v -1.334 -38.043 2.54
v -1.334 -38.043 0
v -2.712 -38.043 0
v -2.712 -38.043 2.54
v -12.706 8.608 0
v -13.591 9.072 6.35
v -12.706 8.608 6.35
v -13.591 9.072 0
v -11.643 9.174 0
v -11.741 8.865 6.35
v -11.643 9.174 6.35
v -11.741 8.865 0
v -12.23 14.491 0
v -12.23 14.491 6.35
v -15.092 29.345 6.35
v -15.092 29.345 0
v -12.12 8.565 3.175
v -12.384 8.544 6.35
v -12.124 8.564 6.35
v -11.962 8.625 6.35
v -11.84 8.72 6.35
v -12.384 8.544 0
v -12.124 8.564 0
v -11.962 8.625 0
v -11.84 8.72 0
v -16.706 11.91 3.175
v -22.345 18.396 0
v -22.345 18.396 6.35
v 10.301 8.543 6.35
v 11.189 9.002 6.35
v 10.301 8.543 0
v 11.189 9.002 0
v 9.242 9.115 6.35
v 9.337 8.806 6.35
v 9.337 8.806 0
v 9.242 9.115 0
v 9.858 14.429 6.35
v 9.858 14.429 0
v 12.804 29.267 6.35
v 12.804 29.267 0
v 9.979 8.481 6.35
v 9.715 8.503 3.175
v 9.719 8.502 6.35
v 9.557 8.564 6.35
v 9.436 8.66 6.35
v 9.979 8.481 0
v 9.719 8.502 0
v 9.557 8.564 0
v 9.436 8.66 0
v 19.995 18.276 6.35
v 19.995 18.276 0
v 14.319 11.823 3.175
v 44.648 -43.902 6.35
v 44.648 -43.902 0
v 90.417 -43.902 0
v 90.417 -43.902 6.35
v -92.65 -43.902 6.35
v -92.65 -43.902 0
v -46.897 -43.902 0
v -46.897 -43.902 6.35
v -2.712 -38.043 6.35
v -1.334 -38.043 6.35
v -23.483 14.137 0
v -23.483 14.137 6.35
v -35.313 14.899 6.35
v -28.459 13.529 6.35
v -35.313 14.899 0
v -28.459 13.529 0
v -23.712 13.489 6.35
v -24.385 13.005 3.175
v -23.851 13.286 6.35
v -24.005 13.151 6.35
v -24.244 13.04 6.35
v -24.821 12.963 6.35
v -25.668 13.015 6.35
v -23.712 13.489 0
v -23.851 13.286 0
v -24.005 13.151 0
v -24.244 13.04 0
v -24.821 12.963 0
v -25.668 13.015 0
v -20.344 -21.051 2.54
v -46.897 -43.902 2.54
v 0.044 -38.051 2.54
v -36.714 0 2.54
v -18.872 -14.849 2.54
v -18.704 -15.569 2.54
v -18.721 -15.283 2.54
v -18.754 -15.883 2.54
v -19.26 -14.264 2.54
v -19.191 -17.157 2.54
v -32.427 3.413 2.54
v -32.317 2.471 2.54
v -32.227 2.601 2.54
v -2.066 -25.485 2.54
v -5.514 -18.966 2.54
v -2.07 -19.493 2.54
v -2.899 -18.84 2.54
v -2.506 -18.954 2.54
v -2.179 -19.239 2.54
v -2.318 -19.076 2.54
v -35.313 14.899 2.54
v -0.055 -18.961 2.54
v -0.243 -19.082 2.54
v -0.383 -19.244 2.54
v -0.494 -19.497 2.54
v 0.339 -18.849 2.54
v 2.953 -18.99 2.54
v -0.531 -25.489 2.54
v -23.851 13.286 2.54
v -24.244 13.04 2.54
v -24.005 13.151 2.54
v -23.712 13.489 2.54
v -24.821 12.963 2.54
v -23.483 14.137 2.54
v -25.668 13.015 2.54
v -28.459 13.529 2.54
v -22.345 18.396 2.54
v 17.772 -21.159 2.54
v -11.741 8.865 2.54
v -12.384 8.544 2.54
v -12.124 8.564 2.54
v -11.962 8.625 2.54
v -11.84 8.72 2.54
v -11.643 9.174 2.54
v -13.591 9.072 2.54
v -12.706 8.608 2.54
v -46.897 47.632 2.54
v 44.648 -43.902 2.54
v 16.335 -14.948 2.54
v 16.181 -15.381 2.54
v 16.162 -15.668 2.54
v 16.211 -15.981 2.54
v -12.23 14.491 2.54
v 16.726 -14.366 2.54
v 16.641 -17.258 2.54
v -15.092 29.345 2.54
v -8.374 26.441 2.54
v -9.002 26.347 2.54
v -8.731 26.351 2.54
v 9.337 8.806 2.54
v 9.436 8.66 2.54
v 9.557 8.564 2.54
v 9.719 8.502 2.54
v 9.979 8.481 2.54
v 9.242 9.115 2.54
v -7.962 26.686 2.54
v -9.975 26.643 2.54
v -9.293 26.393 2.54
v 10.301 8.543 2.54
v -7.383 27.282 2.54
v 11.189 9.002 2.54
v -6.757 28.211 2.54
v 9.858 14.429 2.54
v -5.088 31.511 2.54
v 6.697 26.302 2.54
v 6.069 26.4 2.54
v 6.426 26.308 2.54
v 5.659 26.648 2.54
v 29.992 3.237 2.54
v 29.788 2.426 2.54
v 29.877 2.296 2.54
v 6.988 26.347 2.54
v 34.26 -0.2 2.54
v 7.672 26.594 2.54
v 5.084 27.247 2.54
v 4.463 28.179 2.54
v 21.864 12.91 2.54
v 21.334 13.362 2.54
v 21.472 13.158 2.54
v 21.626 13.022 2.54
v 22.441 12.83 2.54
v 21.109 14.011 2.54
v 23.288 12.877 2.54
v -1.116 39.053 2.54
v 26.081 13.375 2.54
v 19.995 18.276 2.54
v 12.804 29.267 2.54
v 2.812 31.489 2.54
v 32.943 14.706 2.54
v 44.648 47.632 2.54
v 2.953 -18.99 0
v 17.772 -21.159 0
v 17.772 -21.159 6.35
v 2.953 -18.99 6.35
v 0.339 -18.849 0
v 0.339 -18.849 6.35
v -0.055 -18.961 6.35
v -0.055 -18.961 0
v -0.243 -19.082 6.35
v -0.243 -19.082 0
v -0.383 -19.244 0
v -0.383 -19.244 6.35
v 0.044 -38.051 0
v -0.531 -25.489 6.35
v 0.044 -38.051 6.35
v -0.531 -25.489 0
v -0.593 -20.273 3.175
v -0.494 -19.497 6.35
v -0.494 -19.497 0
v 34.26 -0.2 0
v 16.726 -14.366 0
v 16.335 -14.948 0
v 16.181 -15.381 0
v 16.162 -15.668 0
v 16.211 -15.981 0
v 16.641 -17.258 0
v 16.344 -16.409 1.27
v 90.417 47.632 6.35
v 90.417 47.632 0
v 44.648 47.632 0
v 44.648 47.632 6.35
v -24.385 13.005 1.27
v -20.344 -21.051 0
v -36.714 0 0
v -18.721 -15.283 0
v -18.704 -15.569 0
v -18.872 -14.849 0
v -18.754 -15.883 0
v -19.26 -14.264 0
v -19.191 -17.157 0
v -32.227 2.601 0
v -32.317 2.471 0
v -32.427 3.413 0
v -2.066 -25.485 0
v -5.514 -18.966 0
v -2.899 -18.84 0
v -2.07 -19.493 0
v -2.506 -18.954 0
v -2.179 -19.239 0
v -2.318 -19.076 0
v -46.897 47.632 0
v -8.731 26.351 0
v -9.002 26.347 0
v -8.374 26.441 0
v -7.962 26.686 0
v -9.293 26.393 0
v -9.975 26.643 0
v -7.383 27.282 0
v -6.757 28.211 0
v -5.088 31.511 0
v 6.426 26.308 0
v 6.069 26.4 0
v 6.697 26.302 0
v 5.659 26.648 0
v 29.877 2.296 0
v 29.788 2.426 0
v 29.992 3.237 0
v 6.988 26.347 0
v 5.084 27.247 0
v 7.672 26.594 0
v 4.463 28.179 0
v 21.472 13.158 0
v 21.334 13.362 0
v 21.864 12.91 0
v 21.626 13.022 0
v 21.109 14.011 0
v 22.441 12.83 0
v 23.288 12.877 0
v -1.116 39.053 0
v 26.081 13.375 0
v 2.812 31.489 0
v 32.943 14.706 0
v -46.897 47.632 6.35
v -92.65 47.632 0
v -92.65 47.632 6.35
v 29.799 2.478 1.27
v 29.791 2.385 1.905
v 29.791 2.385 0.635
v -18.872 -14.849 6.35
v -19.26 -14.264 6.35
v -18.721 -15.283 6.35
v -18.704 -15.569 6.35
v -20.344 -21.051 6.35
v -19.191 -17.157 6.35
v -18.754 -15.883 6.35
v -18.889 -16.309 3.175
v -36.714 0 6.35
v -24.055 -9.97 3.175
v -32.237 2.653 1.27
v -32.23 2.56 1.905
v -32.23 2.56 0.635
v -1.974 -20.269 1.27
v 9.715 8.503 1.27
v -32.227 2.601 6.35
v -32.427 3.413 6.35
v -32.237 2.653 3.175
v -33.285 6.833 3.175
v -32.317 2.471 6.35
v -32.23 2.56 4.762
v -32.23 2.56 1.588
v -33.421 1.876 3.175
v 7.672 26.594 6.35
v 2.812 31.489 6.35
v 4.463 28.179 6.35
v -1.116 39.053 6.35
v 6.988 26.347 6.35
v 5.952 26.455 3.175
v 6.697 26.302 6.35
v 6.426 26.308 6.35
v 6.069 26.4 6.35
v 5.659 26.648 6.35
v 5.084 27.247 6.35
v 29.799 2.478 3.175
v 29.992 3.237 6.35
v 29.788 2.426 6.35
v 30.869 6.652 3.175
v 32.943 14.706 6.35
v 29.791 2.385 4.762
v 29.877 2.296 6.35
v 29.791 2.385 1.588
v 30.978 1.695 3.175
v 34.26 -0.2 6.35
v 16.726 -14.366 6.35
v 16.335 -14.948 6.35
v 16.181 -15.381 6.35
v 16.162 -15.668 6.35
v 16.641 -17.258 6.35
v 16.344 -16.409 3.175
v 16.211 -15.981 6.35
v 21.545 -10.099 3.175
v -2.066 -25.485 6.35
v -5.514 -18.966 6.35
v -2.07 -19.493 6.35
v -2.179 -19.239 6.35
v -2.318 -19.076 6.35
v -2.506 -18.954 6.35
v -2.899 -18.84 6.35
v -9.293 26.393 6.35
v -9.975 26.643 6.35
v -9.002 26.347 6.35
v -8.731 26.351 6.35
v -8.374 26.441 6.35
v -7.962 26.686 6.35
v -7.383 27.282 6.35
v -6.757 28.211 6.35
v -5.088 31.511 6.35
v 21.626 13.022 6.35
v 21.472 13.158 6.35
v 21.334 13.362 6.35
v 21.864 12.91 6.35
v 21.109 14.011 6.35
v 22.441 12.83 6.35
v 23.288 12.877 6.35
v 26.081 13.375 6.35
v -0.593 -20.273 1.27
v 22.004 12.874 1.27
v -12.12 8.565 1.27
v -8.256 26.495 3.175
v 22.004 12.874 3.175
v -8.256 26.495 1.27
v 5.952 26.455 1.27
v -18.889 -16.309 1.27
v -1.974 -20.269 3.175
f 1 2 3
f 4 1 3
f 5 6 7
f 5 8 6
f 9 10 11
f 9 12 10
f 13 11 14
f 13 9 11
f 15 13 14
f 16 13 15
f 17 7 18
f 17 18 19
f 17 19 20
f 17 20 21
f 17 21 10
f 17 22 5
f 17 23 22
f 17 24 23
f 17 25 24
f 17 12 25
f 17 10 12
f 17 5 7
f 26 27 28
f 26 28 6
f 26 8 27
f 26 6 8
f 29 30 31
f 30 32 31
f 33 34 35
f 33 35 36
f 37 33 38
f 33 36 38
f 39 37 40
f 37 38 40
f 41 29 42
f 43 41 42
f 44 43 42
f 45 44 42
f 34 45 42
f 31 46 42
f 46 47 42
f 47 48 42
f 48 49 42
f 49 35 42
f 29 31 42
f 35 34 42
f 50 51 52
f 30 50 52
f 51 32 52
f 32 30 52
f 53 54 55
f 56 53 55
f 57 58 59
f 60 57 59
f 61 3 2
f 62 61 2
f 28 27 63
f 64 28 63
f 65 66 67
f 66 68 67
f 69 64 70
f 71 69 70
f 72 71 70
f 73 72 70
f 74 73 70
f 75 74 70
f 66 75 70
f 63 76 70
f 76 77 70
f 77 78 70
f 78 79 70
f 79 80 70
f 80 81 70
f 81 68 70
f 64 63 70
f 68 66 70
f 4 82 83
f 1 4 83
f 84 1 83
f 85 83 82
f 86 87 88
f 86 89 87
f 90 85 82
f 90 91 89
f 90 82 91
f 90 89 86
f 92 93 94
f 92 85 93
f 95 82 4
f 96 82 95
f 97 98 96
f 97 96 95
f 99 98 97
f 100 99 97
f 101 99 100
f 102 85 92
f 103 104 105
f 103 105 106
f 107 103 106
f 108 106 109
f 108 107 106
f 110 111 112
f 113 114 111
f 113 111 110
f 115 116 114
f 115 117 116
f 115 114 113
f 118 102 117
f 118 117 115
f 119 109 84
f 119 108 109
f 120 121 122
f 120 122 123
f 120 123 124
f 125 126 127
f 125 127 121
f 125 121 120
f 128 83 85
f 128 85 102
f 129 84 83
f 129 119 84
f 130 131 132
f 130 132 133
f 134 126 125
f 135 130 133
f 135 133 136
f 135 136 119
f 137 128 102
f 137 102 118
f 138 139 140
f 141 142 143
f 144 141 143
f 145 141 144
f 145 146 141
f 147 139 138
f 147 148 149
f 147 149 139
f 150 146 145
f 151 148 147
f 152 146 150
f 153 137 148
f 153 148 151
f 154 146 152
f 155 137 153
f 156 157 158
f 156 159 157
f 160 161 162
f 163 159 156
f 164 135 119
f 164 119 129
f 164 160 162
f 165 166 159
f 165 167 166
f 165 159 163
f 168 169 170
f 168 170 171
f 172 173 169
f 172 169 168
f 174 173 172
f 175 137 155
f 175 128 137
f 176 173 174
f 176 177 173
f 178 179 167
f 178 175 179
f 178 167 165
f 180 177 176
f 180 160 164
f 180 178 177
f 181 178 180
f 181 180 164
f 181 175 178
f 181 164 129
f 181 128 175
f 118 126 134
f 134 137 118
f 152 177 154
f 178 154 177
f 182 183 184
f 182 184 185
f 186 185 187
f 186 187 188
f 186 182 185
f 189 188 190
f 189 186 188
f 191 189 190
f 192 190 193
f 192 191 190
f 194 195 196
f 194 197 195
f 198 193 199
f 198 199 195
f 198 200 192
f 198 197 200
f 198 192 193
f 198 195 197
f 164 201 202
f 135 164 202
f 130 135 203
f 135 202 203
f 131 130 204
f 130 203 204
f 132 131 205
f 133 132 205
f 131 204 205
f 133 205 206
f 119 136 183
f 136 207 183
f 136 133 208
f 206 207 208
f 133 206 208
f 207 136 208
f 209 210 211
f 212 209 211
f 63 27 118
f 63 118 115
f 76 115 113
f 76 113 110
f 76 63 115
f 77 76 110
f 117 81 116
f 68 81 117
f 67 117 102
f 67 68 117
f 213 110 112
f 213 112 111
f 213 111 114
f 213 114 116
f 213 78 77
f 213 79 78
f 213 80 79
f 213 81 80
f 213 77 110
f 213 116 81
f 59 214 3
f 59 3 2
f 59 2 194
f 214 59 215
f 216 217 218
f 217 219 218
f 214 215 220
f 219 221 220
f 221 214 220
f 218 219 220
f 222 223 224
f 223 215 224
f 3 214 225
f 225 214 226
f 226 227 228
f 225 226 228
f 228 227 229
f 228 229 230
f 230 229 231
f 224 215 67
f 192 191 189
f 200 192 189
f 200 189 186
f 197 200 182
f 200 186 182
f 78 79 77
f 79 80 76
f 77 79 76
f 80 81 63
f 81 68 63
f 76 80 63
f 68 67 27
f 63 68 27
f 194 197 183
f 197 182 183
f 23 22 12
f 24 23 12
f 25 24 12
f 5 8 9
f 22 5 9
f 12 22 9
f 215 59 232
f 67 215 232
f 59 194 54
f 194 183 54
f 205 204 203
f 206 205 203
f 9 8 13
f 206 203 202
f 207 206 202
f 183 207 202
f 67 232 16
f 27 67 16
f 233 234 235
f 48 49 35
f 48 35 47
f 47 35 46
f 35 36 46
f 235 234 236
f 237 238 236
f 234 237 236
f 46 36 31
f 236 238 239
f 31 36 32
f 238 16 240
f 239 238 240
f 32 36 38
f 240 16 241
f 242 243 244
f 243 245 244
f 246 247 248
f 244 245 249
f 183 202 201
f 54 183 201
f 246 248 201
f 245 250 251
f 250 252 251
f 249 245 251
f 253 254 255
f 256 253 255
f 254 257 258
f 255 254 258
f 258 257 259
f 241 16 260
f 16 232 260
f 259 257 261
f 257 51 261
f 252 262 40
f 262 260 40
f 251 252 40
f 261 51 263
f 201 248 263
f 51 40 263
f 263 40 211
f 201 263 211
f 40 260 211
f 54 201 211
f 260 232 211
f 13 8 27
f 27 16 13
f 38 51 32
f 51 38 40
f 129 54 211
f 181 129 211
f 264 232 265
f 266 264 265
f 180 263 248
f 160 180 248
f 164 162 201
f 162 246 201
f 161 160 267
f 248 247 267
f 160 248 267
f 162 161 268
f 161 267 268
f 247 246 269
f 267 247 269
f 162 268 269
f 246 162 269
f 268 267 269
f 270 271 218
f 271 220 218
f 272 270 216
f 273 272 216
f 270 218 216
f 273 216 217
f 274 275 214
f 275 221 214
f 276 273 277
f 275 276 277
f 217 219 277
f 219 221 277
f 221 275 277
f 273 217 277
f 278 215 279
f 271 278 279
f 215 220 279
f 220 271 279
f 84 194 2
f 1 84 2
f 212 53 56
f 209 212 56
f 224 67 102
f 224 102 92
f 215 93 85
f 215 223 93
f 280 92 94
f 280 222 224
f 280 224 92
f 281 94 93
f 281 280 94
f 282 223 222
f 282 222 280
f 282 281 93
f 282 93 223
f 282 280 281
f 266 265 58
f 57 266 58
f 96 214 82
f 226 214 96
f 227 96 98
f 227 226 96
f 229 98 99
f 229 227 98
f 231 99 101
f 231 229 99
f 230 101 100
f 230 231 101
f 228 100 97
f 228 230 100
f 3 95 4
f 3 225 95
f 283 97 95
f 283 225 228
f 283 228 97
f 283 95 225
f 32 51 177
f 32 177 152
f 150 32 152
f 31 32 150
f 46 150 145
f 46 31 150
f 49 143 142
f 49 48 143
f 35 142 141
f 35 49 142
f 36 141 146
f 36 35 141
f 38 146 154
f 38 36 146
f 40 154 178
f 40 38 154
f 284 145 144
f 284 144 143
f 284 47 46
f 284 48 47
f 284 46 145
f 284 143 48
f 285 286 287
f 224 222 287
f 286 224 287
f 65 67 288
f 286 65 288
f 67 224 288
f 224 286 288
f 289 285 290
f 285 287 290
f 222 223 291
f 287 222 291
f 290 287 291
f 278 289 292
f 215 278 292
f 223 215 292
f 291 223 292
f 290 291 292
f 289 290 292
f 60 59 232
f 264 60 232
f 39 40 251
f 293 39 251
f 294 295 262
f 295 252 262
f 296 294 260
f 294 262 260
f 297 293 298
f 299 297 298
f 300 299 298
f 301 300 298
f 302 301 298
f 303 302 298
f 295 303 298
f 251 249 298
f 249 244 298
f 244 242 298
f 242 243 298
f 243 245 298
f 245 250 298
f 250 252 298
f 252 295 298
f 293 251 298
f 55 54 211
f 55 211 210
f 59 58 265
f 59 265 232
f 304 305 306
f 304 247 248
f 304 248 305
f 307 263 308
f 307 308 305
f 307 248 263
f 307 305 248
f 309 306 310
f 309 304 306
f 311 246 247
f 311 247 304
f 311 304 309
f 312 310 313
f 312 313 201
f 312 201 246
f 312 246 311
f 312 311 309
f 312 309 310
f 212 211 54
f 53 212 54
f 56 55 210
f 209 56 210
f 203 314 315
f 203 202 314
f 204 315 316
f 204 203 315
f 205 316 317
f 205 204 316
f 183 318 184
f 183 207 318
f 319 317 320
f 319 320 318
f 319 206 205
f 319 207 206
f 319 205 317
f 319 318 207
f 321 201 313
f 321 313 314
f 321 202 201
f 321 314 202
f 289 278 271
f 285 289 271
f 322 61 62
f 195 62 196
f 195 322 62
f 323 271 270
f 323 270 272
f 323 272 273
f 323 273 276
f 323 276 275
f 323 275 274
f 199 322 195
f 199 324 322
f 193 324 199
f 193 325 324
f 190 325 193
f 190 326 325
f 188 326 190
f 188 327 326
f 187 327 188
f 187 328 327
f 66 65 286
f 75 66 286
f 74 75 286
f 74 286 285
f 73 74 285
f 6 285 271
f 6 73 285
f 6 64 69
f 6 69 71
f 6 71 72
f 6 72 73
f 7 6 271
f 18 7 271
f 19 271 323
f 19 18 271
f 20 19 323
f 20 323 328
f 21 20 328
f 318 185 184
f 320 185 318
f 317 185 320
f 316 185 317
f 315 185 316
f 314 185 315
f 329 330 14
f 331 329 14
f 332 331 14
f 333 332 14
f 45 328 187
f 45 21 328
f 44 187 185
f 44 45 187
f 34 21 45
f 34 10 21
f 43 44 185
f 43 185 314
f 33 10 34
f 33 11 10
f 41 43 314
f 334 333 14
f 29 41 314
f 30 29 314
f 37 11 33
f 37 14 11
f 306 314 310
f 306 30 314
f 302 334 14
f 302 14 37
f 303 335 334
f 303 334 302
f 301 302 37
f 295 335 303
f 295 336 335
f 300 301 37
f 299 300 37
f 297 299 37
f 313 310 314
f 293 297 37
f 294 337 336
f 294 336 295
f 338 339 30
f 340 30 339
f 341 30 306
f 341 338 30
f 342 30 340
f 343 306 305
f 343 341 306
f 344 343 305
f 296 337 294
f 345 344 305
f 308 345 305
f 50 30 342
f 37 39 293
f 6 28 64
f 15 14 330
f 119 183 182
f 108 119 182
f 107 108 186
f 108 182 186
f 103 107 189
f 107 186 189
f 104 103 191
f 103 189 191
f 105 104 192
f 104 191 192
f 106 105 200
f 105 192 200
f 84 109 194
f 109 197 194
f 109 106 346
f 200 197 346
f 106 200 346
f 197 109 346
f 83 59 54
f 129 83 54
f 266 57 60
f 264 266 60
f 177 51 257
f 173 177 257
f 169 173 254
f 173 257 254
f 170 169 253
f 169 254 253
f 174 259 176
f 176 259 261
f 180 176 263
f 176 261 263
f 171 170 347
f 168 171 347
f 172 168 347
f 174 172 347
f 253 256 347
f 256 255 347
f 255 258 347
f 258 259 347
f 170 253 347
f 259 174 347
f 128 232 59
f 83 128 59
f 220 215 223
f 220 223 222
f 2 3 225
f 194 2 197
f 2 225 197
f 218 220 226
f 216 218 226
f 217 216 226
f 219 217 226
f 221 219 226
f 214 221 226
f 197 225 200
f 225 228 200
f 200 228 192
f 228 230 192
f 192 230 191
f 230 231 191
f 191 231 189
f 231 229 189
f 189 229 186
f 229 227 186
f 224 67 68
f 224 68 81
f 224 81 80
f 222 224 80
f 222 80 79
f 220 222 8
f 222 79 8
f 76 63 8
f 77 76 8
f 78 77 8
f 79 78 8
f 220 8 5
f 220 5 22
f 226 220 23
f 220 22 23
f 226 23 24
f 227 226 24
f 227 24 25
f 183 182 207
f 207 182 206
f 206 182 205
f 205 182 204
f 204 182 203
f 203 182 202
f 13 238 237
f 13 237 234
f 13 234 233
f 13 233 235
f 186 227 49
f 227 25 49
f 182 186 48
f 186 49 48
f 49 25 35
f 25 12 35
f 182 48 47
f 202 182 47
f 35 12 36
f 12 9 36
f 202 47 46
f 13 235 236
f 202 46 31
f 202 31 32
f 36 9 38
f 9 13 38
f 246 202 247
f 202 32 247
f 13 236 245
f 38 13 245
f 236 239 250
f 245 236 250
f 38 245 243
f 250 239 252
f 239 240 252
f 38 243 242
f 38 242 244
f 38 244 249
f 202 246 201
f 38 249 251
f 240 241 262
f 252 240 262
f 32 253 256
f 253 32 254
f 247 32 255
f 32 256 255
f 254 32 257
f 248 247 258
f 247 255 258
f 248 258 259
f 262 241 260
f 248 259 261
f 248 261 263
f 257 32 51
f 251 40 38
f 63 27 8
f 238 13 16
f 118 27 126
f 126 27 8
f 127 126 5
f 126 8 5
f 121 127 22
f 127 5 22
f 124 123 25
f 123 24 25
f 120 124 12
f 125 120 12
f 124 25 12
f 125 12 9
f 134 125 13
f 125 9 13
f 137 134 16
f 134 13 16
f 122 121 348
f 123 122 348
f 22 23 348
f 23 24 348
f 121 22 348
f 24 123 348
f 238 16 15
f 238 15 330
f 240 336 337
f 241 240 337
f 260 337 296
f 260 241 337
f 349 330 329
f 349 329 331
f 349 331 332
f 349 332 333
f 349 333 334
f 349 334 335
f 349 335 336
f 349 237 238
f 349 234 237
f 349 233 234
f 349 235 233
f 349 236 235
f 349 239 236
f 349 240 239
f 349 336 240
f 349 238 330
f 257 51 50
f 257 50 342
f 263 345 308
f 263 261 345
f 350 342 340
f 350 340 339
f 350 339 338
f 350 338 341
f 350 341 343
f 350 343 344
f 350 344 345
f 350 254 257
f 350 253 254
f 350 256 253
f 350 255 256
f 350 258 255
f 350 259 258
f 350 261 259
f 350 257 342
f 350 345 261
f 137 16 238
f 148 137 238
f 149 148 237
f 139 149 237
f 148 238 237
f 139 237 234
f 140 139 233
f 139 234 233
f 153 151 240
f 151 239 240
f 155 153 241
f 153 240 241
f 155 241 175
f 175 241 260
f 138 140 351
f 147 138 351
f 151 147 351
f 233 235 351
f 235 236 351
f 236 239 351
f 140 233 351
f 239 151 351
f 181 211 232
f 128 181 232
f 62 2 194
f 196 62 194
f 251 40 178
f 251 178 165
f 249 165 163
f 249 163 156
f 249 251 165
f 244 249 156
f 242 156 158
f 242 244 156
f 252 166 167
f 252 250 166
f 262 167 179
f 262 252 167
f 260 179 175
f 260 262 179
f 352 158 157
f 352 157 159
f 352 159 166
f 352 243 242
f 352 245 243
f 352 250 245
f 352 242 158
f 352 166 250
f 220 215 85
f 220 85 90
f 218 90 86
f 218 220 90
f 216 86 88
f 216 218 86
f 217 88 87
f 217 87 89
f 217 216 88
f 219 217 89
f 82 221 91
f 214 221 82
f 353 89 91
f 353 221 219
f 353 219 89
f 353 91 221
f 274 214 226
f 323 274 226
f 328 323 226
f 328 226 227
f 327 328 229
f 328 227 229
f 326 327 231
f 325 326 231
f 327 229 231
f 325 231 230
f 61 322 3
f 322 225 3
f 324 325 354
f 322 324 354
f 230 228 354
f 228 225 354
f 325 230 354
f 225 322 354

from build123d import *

# Parameters (mm, degrees)
F1_DEPTH = 6.35
F2_DEPTH = 6.35
F3_DEPTH = 2.54


with BuildPart() as f1:
    # F0 (on Top) → F1 (new body)
    with BuildSketch(Plane.XY):
        with BuildLine():
            Line((-1.1164610549, 39.0533058461), (-1.3339204969, -38.0429194985))
            Line((-1.3339204969, -38.0429194985), (0.043793726, -38.0506915872))
            add(Edge.make_bspline(
                [(17.7718664224, -21.1589155134), (0.1168053946, -18.7791340155), (-1.0387706532, -16.7492385287), (-0.4033229494, -28.6495818456), (0.043793726, -38.0506915872)],
                knots=[0, 0, 0, 0, 0.5041261797, 1, 1, 1, 1], degree=3))
            add(Edge.make_bspline(
                [(34.259852291, -0.2001895396), (15.8490805469, -14.437276867), (15.606946184, -14.5352669143), (17.1132727169, -18.5110401656), (17.7718664224, -21.1589155134)],
                knots=[0, 0, 0, 0, 0.6881774781, 1, 1, 1, 1], degree=3))
            add(Edge.make_bspline(
                [(32.9433250223, 14.7062445461), (30.3384353377, 4.5988348356), (29.6250505829, 1.7969355622), (29.7988422881, 2.4774735189), (34.259852291, -0.2001895396)],
                knots=[0, 0, 0, 0, 0.6090344785, 1, 1, 1, 1], degree=3))
            add(Edge.make_bspline(
                [(19.9948317708, 18.2764506918), (21.3200481739, 14.2618131265), (20.2614912616, 11.4966035445), (28.156229911, 14.0229906255), (32.9433250223, 14.7062445461)],
                knots=[0, 0, 0, 0, 0.4189137049, 1, 1, 1, 1], degree=3))
            add(Edge.make_bspline(
                [(19.9948317708, 18.2764506918), (12.7340992756, 9.5459144575), (8.0946791533, 6.723535087), (9.1870973138, 11.2900662286), (12.8041103318, 29.2666911636)],
                knots=[0, 0, 0, 0, 0.4511568874, 1, 1, 1, 1], degree=3))
            add(Edge.make_bspline(
                [(12.8041103318, 29.2666911636), (8.8818789195, 27.6771241004), (5.2027866351, 23.0069980044), (2.3285752692, 33.7038039952), (-1.1164610549, 39.0533058461)],
                knots=[0, 0, 0, 0, 0.4172698872, 1, 1, 1, 1], degree=3))
        make_face()
        with BuildLine():
            add(Edge.make_bspline(
                [(-20.3441573239, -21.0514045527), (-2.6759523888, -18.7712566966), (-1.5089436766, -16.7479123475), (-2.2115135166, -28.6444816204), (-2.7116566419, -38.0429194985)],
                knots=[0, 0, 0, 0, 0.5041261797, 1, 1, 1, 1], degree=3))
            Line((-2.7116566419, -38.0429194985), (-1.3339204969, -38.0429194985))
            Line((-1.3339204969, -38.0429194985), (-1.1164610549, 39.0533058461))
            add(Edge.make_bspline(
                [(-15.0920192174, 29.3453756483), (-11.1788172842, 27.7337077759), (-7.5261286677, 23.0429014849), (-4.5916201862, 33.7233232627), (-1.1164610549, 39.0533058461)],
                knots=[0, 0, 0, 0, 0.4172698872, 1, 1, 1, 1], degree=3))
            add(Edge.make_bspline(
                [(-22.3446244123, 18.3958743662), (-15.1332581712, 9.624517787), (-10.5098334836, 6.7760114166), (-11.5764735348, 11.3486324491), (-15.0920192174, 29.3453756483)],
                knots=[0, 0, 0, 0, 0.4511568874, 1, 1, 1, 1], degree=3))
            add(Edge.make_bspline(
                [(-22.3446244123, 18.3958743662), (-23.6924671127, 14.3887764949), (-22.6495261512, 11.617639378), (-30.5298873205, 14.1885220798), (-35.3130518872, 14.8987701018)],
                knots=[0, 0, 0, 0, 0.4189137049, 1, 1, 1, 1], degree=3))
            add(Edge.make_bspline(
                [(-35.3130518872, 14.8987701018), (-32.7652215964, 4.7768265072), (-32.0676542741, 1.9709474689), (-32.2376041616, 2.6524549912), (-36.7136484219, 0)],
                knots=[0, 0, 0, 0, 0.6090344785, 1, 1, 1, 1], degree=3))
            add(Edge.make_bspline(
                [(-36.7136484219, 0), (-18.3834839181, -14.3407196837), (-18.1419061896, -14.4400741007), (-19.6706368965, -18.4072865976), (-20.3441573239, -21.0514045527)],
                knots=[0, 0, 0, 0, 0.6881774781, 1, 1, 1, 1], degree=3))
        make_face()
    extrude(amount=F1_DEPTH)


with BuildPart() as f2:
    # F0 (on Top) → F2 (new body)
    with BuildSketch(Plane.XY):
        Polygon((90.4174440865, 47.6318820421), (44.6475883337, 47.6318820421), (44.6475883337, -43.2670230994), (44.6475883337, -43.9020230994), (90.4174440865, -43.9020230994), align=None)
    extrude(amount=F2_DEPTH)


with BuildPart() as f2b:
    # F0 (on Top) → F2, piece 2 (new body)
    with BuildSketch(Plane.XY):
        Polygon((-46.8966577759, 47.6318820421), (-92.6503661963, 47.6318820421), (-92.6503661963, -43.9020230994), (-46.8966577759, -43.9020230994), (-46.8966577759, -43.2670230994), align=None)
    extrude(amount=F2_DEPTH)


with BuildPart() as f3:
    # F0 (on Top) → F3 (new body)
    with BuildSketch(Plane.XY):
        Polygon((44.6475883337, 47.6318820421), (-46.8966577759, 47.6318820421), (-46.8966577759, -43.2670230994), (-46.8966577759, -43.9020230994), (44.6475883337, -43.9020230994), (44.6475883337, -43.2670230994), align=None)
        with BuildLine():
            Line((-1.3339204969, -38.0429194985), (-2.7116566419, -38.0429194985))
            add(Edge.make_bspline(
                [(-20.3441573239, -21.0514045527), (-2.6759523888, -18.7712566966), (-1.5089436766, -16.7479123475), (-2.2115135166, -28.6444816204), (-2.7116566419, -38.0429194985)],
                knots=[0, 0, 0, 0, 0.5041261797, 1, 1, 1, 1], degree=3))
            add(Edge.make_bspline(
                [(-36.7136484219, 0), (-18.3834839181, -14.3407196837), (-18.1419061896, -14.4400741007), (-19.6706368965, -18.4072865976), (-20.3441573239, -21.0514045527)],
                knots=[0, 0, 0, 0, 0.6881774781, 1, 1, 1, 1], degree=3))
            add(Edge.make_bspline(
                [(-35.3130518872, 14.8987701018), (-32.7652215964, 4.7768265072), (-32.0676542741, 1.9709474689), (-32.2376041616, 2.6524549912), (-36.7136484219, 0)],
                knots=[0, 0, 0, 0, 0.6090344785, 1, 1, 1, 1], degree=3))
            add(Edge.make_bspline(
                [(-22.3446244123, 18.3958743662), (-23.6924671127, 14.3887764949), (-22.6495261512, 11.617639378), (-30.5298873205, 14.1885220798), (-35.3130518872, 14.8987701018)],
                knots=[0, 0, 0, 0, 0.4189137049, 1, 1, 1, 1], degree=3))
            add(Edge.make_bspline(
                [(-22.3446244123, 18.3958743662), (-15.1332581712, 9.624517787), (-10.5098334836, 6.7760114166), (-11.5764735348, 11.3486324491), (-15.0920192174, 29.3453756483)],
                knots=[0, 0, 0, 0, 0.4511568874, 1, 1, 1, 1], degree=3))
            add(Edge.make_bspline(
                [(-15.0920192174, 29.3453756483), (-11.1788172842, 27.7337077759), (-7.5261286677, 23.0429014849), (-4.5916201862, 33.7233232627), (-1.1164610549, 39.0533058461)],
                knots=[0, 0, 0, 0, 0.4172698872, 1, 1, 1, 1], degree=3))
            add(Edge.make_bspline(
                [(12.8041103318, 29.2666911636), (8.8818789195, 27.6771241004), (5.2027866351, 23.0069980044), (2.3285752692, 33.7038039952), (-1.1164610549, 39.0533058461)],
                knots=[0, 0, 0, 0, 0.4172698872, 1, 1, 1, 1], degree=3))
            add(Edge.make_bspline(
                [(19.9948317708, 18.2764506918), (12.7340992756, 9.5459144575), (8.0946791533, 6.723535087), (9.1870973138, 11.2900662286), (12.8041103318, 29.2666911636)],
                knots=[0, 0, 0, 0, 0.4511568874, 1, 1, 1, 1], degree=3))
            add(Edge.make_bspline(
                [(19.9948317708, 18.2764506918), (21.3200481739, 14.2618131265), (20.2614912616, 11.4966035445), (28.156229911, 14.0229906255), (32.9433250223, 14.7062445461)],
                knots=[0, 0, 0, 0, 0.4189137049, 1, 1, 1, 1], degree=3))
            add(Edge.make_bspline(
                [(32.9433250223, 14.7062445461), (30.3384353377, 4.5988348356), (29.6250505829, 1.7969355622), (29.7988422881, 2.4774735189), (34.259852291, -0.2001895396)],
                knots=[0, 0, 0, 0, 0.6090344785, 1, 1, 1, 1], degree=3))
            add(Edge.make_bspline(
                [(34.259852291, -0.2001895396), (15.8490805469, -14.437276867), (15.606946184, -14.5352669143), (17.1132727169, -18.5110401656), (17.7718664224, -21.1589155134)],
                knots=[0, 0, 0, 0, 0.6881774781, 1, 1, 1, 1], degree=3))
            add(Edge.make_bspline(
                [(17.7718664224, -21.1589155134), (0.1168053946, -18.7791340155), (-1.0387706532, -16.7492385287), (-0.4033229494, -28.6495818456), (0.043793726, -38.0506915872)],
                knots=[0, 0, 0, 0, 0.5041261797, 1, 1, 1, 1], degree=3))
            Line((0.043793726, -38.0506915872), (-1.3339204969, -38.0429194985))
        make_face(mode=Mode.SUBTRACT)
    extrude(amount=F3_DEPTH)


solid = Compound([f1.part, f2.part, f2b.part, f3.part])
